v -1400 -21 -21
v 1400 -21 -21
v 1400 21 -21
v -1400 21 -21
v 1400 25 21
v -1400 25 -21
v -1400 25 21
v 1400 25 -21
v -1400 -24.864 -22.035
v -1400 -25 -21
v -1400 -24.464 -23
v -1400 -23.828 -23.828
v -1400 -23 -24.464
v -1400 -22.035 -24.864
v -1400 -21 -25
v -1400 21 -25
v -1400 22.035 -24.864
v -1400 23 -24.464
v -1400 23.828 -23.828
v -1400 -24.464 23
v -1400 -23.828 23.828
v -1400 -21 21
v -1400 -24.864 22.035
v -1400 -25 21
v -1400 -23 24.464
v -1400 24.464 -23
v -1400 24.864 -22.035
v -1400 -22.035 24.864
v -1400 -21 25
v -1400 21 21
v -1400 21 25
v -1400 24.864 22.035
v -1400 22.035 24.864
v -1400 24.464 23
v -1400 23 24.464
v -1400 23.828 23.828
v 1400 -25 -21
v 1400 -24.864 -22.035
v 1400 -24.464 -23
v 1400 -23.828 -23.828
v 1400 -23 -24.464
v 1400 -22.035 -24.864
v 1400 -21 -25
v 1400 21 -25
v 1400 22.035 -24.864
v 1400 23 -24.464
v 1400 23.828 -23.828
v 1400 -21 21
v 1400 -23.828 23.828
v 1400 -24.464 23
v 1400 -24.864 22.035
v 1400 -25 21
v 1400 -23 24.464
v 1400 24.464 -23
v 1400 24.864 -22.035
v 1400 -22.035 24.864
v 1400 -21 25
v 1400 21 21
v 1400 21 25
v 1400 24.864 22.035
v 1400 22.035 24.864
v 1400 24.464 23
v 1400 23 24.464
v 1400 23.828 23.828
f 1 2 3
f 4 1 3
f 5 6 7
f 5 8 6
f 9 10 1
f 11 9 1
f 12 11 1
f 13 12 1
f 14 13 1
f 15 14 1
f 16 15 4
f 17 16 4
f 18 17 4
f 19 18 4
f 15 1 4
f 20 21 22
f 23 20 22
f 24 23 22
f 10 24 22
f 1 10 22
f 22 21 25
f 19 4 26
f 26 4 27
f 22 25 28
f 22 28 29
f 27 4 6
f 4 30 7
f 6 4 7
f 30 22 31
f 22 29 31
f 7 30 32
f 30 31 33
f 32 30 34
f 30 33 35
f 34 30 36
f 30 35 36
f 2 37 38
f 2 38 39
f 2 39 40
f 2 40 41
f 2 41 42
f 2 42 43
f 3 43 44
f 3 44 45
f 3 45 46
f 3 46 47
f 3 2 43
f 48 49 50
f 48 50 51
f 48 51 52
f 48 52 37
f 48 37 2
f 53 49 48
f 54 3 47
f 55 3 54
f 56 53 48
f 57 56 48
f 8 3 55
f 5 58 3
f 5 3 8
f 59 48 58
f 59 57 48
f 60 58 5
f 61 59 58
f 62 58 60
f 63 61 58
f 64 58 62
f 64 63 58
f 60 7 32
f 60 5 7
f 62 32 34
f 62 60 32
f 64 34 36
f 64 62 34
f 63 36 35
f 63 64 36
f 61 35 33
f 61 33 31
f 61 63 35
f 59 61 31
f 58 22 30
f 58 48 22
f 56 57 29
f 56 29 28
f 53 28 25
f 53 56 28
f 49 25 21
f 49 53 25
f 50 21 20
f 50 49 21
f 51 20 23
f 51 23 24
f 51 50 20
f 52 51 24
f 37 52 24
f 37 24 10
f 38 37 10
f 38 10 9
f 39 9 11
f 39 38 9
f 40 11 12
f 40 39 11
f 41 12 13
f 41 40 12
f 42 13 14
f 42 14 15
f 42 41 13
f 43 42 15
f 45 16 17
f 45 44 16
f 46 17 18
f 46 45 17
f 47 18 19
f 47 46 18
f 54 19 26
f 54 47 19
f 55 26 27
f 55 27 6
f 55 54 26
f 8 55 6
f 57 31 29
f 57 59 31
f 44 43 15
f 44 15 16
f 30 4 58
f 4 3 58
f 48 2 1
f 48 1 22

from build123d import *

# Parameters (mm, degrees)
F0_W     = 42
F0_H     = 42
F1_DEPTH = 1400


with BuildPart() as f1:
    # F0 (on Right) → F1 (new body, symmetric)
    with BuildSketch(Plane.YZ):
        with BuildLine():
            Line((21, 25), (-21, 25))
            ThreePointArc((-21, 25), (-23.828427, 23.828427), (-25, 21))
            Line((-25, 21), (-25, -21))
            ThreePointArc((-25, -21), (-23.828427, -23.828427), (-21, -25))
            Line((-21, -25), (21, -25))
            ThreePointArc((21, -25), (23.828427, -23.828427), (25, -21))
            Line((25, -21), (25, 21))
            ThreePointArc((25, 21), (23.828427, 23.828427), (21, 25))
        make_face()
        Rectangle(F0_W, F0_H, mode=Mode.SUBTRACT)
    extrude(amount=F1_DEPTH, both=True)


solid = f1.part
